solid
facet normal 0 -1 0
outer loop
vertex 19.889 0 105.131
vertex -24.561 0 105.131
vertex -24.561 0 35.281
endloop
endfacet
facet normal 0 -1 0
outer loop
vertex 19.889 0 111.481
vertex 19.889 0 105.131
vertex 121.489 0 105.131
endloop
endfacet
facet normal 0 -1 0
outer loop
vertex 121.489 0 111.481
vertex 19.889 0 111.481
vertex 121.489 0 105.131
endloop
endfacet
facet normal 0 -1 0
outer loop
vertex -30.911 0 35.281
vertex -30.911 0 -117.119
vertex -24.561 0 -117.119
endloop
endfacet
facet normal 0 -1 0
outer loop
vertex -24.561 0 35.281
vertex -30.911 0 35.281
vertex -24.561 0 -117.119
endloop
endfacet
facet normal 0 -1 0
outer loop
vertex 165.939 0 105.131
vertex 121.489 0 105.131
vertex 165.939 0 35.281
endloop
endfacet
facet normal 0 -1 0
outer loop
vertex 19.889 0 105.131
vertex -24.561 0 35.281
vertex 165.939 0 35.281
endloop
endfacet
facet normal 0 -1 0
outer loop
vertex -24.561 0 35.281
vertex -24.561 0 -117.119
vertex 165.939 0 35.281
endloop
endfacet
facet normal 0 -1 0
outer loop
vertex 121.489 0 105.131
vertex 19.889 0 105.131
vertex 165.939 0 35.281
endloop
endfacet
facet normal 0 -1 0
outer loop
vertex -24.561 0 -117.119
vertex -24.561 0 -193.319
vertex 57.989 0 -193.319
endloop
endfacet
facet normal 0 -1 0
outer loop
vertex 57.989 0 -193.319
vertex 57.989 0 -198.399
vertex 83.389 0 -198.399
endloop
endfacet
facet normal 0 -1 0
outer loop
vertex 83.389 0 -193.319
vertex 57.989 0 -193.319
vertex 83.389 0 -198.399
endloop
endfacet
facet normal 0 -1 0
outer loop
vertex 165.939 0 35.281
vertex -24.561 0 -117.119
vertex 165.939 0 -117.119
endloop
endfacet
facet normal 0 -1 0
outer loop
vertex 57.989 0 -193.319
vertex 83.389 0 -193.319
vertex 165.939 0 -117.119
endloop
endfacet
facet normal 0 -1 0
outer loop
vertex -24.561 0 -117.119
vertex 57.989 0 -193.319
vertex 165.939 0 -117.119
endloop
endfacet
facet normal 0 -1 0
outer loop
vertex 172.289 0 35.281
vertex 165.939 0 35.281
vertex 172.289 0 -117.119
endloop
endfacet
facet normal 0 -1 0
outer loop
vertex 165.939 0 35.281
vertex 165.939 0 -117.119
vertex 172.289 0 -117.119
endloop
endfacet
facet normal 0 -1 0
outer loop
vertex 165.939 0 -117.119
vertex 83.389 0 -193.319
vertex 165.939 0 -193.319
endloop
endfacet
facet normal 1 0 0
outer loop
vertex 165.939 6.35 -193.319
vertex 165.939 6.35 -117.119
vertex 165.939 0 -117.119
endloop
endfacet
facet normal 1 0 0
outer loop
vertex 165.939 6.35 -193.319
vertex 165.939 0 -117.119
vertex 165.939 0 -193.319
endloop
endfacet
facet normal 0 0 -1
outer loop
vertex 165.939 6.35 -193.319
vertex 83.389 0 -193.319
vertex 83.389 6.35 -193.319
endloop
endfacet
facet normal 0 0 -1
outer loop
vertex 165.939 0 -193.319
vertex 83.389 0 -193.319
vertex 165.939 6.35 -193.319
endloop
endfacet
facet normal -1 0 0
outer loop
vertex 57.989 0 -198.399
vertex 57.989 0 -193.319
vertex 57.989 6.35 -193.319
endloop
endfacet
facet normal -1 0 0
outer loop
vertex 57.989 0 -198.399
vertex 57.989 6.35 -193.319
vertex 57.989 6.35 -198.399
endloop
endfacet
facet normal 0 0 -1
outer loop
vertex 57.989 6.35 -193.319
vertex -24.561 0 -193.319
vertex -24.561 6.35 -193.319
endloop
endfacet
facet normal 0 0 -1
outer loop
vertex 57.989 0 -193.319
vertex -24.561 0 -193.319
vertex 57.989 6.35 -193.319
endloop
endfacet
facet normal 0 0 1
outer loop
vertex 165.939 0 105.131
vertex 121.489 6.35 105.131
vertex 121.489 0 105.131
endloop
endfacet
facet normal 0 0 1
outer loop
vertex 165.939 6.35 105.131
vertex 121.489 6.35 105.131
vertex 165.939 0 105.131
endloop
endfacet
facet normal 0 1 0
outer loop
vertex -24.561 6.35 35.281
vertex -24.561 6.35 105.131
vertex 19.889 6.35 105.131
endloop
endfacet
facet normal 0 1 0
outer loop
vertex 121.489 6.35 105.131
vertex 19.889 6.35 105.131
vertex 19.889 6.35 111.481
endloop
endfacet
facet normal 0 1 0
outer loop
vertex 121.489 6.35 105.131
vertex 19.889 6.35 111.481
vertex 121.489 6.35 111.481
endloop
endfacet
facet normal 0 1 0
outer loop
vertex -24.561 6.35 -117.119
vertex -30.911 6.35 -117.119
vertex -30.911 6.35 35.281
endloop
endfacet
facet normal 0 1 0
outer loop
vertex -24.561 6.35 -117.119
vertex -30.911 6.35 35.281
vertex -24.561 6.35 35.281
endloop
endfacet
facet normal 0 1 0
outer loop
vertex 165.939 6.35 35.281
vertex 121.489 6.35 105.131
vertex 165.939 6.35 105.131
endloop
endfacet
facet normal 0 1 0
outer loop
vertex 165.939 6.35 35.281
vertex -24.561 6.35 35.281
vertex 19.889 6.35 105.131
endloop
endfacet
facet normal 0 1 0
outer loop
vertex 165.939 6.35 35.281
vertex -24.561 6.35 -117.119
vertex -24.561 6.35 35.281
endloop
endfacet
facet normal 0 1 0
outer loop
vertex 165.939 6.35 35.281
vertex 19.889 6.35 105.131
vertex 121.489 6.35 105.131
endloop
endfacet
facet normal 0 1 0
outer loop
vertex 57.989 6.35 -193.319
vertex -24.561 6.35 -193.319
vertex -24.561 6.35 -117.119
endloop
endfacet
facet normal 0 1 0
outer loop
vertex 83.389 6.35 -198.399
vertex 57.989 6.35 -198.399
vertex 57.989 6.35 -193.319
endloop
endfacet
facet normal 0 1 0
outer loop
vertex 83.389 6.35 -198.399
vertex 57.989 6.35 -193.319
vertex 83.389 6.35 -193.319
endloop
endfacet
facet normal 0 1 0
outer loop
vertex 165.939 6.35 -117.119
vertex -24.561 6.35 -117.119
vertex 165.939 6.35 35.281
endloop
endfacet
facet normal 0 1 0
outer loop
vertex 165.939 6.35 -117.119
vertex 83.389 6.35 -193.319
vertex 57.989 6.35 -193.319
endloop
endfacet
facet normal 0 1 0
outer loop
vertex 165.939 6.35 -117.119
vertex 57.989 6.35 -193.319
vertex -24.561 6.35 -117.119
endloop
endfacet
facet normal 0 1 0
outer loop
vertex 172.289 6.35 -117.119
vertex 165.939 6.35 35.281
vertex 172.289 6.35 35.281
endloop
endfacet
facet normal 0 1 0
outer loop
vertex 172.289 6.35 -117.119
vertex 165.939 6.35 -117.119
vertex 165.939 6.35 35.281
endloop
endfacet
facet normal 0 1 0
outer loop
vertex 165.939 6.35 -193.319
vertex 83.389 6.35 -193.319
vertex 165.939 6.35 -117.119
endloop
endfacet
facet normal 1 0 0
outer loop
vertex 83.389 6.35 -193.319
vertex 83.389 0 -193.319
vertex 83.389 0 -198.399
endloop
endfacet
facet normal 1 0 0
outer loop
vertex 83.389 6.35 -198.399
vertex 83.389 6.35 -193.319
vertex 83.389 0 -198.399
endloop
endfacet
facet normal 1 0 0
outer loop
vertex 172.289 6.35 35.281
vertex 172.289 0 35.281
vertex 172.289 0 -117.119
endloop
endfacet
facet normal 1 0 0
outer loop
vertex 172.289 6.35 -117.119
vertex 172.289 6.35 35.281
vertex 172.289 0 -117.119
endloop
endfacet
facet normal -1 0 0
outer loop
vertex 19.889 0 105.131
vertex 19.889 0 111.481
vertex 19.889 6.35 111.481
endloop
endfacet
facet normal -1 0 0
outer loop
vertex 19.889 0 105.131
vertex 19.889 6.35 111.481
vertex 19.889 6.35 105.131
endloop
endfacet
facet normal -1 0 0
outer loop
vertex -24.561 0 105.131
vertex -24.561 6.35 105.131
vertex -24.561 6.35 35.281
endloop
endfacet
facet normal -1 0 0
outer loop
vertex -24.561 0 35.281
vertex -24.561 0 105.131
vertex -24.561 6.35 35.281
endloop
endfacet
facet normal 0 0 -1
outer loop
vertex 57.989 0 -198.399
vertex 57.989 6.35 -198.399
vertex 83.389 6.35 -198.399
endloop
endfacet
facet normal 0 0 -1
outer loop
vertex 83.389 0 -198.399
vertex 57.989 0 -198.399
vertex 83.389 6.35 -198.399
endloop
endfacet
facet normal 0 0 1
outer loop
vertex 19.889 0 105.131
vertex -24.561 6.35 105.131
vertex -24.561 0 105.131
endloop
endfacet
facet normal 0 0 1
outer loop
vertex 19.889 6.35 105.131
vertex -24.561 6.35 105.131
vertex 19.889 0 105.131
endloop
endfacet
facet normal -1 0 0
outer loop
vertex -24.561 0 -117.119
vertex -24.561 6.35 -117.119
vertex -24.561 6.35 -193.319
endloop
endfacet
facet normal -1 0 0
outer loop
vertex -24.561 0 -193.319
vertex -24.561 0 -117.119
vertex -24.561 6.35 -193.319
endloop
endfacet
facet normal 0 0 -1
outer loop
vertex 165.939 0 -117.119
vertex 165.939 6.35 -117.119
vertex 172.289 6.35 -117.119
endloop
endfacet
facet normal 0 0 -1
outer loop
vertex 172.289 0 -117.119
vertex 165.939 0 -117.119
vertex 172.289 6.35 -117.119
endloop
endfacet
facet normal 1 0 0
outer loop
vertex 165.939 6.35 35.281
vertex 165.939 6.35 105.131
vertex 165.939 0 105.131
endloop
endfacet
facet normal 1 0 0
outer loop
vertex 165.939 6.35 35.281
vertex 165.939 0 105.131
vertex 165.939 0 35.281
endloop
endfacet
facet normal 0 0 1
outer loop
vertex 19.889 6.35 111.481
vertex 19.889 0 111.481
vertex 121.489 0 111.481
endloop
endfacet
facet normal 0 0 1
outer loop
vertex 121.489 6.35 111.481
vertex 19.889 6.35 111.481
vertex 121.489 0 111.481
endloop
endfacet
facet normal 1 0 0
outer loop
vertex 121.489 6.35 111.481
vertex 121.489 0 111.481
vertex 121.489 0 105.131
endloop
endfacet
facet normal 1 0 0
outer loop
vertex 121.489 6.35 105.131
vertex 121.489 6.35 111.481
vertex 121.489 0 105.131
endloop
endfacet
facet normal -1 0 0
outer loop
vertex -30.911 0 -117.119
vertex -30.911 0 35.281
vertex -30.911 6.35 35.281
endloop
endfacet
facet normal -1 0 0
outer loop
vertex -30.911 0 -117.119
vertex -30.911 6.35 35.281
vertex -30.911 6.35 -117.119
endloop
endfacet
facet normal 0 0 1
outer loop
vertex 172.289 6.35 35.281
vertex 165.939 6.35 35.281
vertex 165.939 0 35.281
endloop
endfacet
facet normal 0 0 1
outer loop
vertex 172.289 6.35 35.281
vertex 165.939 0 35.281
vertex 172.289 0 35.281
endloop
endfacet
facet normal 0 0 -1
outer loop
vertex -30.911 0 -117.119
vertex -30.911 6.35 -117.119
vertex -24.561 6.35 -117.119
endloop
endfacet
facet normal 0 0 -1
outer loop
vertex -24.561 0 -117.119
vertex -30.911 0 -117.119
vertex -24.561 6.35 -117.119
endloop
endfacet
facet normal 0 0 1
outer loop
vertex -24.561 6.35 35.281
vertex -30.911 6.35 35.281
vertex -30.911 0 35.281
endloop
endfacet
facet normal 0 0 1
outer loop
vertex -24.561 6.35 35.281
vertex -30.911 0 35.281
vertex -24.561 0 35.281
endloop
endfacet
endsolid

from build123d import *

# Parameters (mm, degrees)
SKETCH1_W           = 203.2
SKETCH1_H           = 304.8
BOSS_EXTRUDE1_DEPTH = 6.35
SKETCH2_W           = 6.35
SKETCH2_H           = 76.2
CUT_EXTRUDE1_DEPTH  = 6.35
SKETCH3_W           = 25.4
SKETCH3_H           = 5.08
BOSS_EXTRUDE3_DEPTH = 6.35
SKETCH5_W           = 44.45
SKETCH5_H           = 6.35
CUT_EXTRUDE2_DEPTH  = 6.35


with BuildPart() as part:
    # Sketch1 → Boss-Extrude1 (new body)
    with BuildSketch(Plane(origin=(0, 0, 0), x_dir=(1, 0, 0), z_dir=(0, 1, 0))):
        with Locations((70.689276808, 40.918703242)):
            Rectangle(SKETCH1_W, SKETCH1_H)
    extrude(amount=BOSS_EXTRUDE1_DEPTH)

    # Sketch2 → Cut-Extrude1 (cut)
    with BuildSketch(Plane(origin=(0, 6.35, 0), x_dir=(1, 0, 0), z_dir=(0, 1, 0))):
        with Locations((-27.735723192, -73.381296758)):
            Rectangle(SKETCH2_W, SKETCH2_H)
        with Locations((-27.735723192, 155.218703242)):
            Rectangle(SKETCH2_W, SKETCH2_H)
        with Locations((169.114276808, 155.218703242)):
            Rectangle(SKETCH2_W, SKETCH2_H)
        with Locations((169.114276808, -73.381296758)):
            Rectangle(SKETCH2_W, SKETCH2_H)
    extrude(amount=-CUT_EXTRUDE1_DEPTH, mode=Mode.SUBTRACT)

    # Sketch3 → Boss-Extrude3 (add)
    with BuildSketch(Plane(origin=(0, 6.35, 0), x_dir=(1, 0, 0), z_dir=(0, 1, 0))):
        with Locations((70.689276808, 195.858703242)):
            Rectangle(SKETCH3_W, SKETCH3_H)
    extrude(amount=-BOSS_EXTRUDE3_DEPTH)

    # Sketch5 → Cut-Extrude2 (cut)
    with BuildSketch(Plane(origin=(0, 6.35, 0), x_dir=(1, 0, 0), z_dir=(0, 1, 0))):
        with Locations((-2.335723192, -108.306296758)):
            Rectangle(SKETCH5_W, SKETCH5_H)
        with Locations((143.714276808, -108.306296758)):
            Rectangle(SKETCH5_W, SKETCH5_H)
    extrude(amount=-CUT_EXTRUDE2_DEPTH, mode=Mode.SUBTRACT)


solid = part.part
